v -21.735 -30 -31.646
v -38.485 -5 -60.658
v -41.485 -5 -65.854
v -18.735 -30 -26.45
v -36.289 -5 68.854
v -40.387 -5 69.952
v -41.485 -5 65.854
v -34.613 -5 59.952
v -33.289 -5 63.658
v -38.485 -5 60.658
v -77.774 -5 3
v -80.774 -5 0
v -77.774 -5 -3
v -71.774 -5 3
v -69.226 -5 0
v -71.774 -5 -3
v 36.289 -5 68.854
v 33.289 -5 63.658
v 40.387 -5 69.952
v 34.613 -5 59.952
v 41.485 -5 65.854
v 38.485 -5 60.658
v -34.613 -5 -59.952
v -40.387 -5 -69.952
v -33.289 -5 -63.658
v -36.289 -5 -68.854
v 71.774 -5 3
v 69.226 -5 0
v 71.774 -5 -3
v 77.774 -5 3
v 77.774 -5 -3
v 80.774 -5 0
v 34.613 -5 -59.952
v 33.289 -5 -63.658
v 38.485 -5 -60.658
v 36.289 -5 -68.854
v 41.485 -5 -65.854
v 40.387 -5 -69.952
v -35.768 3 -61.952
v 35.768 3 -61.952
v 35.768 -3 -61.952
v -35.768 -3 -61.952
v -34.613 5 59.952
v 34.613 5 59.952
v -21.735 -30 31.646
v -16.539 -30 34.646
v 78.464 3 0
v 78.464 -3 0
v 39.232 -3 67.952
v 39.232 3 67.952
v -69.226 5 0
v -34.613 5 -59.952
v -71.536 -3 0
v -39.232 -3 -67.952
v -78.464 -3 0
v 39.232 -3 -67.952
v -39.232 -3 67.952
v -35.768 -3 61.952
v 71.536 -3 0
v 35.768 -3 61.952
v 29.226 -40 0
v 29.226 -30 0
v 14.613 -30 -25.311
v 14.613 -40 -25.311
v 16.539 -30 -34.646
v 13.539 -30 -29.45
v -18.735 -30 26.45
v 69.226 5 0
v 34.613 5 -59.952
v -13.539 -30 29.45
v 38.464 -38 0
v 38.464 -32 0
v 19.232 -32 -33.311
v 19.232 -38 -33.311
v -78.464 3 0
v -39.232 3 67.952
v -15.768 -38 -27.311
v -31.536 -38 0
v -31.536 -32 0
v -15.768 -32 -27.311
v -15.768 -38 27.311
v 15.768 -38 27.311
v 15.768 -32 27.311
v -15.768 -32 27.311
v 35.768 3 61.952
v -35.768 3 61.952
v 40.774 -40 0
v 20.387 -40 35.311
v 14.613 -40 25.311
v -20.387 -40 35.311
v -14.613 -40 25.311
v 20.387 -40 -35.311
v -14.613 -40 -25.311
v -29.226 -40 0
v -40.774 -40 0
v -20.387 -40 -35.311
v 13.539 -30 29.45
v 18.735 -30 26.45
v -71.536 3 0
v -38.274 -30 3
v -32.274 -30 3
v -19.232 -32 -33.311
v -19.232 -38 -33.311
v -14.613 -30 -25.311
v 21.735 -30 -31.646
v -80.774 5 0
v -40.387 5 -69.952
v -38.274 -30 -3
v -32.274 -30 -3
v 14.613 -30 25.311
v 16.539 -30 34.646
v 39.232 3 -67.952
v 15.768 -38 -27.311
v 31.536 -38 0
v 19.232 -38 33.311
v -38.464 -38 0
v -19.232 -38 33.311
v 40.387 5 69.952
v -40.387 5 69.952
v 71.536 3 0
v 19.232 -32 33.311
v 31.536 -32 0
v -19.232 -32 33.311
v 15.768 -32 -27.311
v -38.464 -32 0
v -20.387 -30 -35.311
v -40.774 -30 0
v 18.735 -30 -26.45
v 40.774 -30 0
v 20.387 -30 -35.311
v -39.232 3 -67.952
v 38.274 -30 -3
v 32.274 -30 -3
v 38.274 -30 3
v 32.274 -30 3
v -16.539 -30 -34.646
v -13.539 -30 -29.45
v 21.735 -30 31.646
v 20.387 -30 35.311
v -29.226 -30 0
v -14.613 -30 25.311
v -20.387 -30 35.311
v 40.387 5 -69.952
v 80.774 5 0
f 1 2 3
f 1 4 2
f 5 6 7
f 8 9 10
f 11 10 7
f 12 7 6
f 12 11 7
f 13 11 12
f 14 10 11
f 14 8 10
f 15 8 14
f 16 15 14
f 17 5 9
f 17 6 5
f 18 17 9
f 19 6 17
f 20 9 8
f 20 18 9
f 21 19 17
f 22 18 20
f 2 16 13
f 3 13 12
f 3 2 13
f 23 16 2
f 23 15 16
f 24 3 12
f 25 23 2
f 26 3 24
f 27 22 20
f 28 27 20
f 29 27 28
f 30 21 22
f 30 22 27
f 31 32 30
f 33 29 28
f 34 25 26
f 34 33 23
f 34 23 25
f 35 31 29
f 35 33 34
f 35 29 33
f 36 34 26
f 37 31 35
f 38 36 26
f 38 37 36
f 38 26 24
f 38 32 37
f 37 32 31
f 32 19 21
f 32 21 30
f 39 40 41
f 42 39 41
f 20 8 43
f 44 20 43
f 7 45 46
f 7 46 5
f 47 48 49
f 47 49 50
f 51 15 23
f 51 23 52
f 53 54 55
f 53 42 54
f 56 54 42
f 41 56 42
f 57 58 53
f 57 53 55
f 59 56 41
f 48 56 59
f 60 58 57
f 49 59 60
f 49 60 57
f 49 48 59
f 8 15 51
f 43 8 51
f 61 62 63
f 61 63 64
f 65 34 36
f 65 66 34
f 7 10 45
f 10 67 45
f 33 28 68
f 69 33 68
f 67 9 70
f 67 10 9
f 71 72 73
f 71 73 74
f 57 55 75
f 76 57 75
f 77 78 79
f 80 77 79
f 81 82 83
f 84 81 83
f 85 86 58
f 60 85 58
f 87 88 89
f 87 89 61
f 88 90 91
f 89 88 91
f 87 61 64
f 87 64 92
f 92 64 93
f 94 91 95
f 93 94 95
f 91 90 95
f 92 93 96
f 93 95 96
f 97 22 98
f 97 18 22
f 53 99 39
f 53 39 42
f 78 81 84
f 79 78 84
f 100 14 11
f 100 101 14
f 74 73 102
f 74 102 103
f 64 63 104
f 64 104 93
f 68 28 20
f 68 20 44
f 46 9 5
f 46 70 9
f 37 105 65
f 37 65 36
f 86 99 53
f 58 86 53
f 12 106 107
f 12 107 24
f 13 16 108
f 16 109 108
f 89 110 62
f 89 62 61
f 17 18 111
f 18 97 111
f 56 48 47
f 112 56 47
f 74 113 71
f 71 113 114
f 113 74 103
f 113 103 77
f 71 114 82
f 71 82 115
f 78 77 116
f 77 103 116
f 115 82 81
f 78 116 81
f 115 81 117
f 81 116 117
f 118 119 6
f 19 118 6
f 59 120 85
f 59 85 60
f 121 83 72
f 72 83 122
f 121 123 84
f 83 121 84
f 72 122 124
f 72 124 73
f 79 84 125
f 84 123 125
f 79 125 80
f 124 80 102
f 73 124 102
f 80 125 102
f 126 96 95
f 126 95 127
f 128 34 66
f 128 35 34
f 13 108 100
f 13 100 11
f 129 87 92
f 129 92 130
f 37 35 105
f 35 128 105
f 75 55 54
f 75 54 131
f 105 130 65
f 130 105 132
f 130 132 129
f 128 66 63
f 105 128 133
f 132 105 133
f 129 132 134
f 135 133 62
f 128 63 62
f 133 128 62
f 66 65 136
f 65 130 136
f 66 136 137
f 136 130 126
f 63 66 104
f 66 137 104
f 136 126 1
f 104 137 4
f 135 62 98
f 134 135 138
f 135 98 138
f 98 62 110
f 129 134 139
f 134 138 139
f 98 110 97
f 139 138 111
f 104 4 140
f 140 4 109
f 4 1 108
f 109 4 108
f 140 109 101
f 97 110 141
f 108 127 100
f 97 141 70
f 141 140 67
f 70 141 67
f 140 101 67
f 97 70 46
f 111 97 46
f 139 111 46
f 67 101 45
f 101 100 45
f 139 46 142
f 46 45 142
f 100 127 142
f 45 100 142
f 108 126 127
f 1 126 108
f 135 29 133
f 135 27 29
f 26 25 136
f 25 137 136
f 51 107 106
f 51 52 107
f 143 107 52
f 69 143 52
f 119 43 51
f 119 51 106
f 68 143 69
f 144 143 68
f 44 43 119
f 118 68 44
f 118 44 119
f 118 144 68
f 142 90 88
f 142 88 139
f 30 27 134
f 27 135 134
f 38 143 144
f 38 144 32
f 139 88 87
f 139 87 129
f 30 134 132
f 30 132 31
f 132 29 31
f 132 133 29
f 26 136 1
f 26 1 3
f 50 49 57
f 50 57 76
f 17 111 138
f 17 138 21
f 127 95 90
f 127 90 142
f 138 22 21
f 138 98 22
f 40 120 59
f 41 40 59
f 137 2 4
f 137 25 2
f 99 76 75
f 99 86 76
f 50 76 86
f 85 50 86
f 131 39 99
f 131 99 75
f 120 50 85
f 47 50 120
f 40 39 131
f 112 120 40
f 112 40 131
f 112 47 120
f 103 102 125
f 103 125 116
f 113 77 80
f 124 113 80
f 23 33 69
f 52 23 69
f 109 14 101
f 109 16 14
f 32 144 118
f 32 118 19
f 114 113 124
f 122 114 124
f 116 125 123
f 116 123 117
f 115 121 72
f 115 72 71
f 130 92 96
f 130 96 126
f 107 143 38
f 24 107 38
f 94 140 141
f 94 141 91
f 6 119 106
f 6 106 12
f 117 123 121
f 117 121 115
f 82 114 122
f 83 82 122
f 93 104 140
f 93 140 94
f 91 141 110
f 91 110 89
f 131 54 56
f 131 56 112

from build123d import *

# Parameters (mm, degrees)
F1_W      = 10
F1_H      = 10
F1_W_2    = 6
F1_H_2    = 6
F5_W      = 10
F5_H      = 10
F5_W_2    = 6
F5_H_2    = 6
F8_DEPTH  = 3
F10_COUNT = 6


with BuildPart() as f2:
    # F2: sweep along a path in F0
    with BuildLine(Plane.XZ) as f2_path:
        Line((-37.5, 64.9519052838), (37.5, 64.9519052838))
        Line((37.5, 64.9519052838), (75, 0))
        Line((75, 0), (37.5, -64.9519052838))
        Line((37.5, -64.9519052838), (-37.5, -64.9519052838))
        Line((-37.5, -64.9519052838), (-75, 0))
        Line((-75, 0), (-37.5, 64.9519052838))
    # F1 (on Right) → F2 (sweep)
    with BuildSketch(Plane.YZ):
        with Locations((0, 64.9519052838)):
            Rectangle(F1_W, F1_H)
        with Locations((0, 64.9519052838)):
            Rectangle(F1_W_2, F1_H_2, mode=Mode.SUBTRACT)
    sweep(path=f2_path.line, transition=Transition.RIGHT)



with BuildPart() as f6:
    # F6: sweep along a path in F4
    with BuildLine(Plane.XZ.offset(35)) as f6_path:
        Line((17.5, -30.3108891325), (-17.5, -30.3108891325))
        Line((-17.5, -30.3108891325), (-35, 0))
        Line((-35, 0), (-17.5, 30.3108891325))
        Line((-17.5, 30.3108891325), (17.5, 30.3108891325))
        Line((17.5, 30.3108891325), (35, 0))
        Line((35, 0), (17.5, -30.3108891325))
    # F5 (on Right) → F6 (sweep)
    with BuildSketch(Plane.YZ):
        with Locations((-35, -30.3108891325)):
            Rectangle(F5_W, F5_H)
        with Locations((-35, -30.3108891325)):
            Rectangle(F5_W_2, F5_H_2, mode=Mode.SUBTRACT)
    sweep(path=f6_path.line, transition=Transition.RIGHT)


with BuildPart() as f2_1:
    add(f2.part)

    add(f6.part)  # F8 merges F6
    # F7 (on Top) → F8 (join, symmetric)
    with BuildSketch(Plane.XY):
        Polygon((71.7735026919, -5), (32.2735026919, -30), (38.2735026919, -30), (77.7735026919, -5), align=None)
    extrude(amount=F8_DEPTH, both=True)

    # F10: F2 ×6 about axis
    f10_axis = Axis((0, -16.170989722, 0), (0, 1, 0))


with BuildPart() as f2_2:
    add(f2_1.part)
    for i in range(1, F10_COUNT):
        add(f2_1.part.rotate(f10_axis, i * 360 / F10_COUNT))


solid = f2_2.part
